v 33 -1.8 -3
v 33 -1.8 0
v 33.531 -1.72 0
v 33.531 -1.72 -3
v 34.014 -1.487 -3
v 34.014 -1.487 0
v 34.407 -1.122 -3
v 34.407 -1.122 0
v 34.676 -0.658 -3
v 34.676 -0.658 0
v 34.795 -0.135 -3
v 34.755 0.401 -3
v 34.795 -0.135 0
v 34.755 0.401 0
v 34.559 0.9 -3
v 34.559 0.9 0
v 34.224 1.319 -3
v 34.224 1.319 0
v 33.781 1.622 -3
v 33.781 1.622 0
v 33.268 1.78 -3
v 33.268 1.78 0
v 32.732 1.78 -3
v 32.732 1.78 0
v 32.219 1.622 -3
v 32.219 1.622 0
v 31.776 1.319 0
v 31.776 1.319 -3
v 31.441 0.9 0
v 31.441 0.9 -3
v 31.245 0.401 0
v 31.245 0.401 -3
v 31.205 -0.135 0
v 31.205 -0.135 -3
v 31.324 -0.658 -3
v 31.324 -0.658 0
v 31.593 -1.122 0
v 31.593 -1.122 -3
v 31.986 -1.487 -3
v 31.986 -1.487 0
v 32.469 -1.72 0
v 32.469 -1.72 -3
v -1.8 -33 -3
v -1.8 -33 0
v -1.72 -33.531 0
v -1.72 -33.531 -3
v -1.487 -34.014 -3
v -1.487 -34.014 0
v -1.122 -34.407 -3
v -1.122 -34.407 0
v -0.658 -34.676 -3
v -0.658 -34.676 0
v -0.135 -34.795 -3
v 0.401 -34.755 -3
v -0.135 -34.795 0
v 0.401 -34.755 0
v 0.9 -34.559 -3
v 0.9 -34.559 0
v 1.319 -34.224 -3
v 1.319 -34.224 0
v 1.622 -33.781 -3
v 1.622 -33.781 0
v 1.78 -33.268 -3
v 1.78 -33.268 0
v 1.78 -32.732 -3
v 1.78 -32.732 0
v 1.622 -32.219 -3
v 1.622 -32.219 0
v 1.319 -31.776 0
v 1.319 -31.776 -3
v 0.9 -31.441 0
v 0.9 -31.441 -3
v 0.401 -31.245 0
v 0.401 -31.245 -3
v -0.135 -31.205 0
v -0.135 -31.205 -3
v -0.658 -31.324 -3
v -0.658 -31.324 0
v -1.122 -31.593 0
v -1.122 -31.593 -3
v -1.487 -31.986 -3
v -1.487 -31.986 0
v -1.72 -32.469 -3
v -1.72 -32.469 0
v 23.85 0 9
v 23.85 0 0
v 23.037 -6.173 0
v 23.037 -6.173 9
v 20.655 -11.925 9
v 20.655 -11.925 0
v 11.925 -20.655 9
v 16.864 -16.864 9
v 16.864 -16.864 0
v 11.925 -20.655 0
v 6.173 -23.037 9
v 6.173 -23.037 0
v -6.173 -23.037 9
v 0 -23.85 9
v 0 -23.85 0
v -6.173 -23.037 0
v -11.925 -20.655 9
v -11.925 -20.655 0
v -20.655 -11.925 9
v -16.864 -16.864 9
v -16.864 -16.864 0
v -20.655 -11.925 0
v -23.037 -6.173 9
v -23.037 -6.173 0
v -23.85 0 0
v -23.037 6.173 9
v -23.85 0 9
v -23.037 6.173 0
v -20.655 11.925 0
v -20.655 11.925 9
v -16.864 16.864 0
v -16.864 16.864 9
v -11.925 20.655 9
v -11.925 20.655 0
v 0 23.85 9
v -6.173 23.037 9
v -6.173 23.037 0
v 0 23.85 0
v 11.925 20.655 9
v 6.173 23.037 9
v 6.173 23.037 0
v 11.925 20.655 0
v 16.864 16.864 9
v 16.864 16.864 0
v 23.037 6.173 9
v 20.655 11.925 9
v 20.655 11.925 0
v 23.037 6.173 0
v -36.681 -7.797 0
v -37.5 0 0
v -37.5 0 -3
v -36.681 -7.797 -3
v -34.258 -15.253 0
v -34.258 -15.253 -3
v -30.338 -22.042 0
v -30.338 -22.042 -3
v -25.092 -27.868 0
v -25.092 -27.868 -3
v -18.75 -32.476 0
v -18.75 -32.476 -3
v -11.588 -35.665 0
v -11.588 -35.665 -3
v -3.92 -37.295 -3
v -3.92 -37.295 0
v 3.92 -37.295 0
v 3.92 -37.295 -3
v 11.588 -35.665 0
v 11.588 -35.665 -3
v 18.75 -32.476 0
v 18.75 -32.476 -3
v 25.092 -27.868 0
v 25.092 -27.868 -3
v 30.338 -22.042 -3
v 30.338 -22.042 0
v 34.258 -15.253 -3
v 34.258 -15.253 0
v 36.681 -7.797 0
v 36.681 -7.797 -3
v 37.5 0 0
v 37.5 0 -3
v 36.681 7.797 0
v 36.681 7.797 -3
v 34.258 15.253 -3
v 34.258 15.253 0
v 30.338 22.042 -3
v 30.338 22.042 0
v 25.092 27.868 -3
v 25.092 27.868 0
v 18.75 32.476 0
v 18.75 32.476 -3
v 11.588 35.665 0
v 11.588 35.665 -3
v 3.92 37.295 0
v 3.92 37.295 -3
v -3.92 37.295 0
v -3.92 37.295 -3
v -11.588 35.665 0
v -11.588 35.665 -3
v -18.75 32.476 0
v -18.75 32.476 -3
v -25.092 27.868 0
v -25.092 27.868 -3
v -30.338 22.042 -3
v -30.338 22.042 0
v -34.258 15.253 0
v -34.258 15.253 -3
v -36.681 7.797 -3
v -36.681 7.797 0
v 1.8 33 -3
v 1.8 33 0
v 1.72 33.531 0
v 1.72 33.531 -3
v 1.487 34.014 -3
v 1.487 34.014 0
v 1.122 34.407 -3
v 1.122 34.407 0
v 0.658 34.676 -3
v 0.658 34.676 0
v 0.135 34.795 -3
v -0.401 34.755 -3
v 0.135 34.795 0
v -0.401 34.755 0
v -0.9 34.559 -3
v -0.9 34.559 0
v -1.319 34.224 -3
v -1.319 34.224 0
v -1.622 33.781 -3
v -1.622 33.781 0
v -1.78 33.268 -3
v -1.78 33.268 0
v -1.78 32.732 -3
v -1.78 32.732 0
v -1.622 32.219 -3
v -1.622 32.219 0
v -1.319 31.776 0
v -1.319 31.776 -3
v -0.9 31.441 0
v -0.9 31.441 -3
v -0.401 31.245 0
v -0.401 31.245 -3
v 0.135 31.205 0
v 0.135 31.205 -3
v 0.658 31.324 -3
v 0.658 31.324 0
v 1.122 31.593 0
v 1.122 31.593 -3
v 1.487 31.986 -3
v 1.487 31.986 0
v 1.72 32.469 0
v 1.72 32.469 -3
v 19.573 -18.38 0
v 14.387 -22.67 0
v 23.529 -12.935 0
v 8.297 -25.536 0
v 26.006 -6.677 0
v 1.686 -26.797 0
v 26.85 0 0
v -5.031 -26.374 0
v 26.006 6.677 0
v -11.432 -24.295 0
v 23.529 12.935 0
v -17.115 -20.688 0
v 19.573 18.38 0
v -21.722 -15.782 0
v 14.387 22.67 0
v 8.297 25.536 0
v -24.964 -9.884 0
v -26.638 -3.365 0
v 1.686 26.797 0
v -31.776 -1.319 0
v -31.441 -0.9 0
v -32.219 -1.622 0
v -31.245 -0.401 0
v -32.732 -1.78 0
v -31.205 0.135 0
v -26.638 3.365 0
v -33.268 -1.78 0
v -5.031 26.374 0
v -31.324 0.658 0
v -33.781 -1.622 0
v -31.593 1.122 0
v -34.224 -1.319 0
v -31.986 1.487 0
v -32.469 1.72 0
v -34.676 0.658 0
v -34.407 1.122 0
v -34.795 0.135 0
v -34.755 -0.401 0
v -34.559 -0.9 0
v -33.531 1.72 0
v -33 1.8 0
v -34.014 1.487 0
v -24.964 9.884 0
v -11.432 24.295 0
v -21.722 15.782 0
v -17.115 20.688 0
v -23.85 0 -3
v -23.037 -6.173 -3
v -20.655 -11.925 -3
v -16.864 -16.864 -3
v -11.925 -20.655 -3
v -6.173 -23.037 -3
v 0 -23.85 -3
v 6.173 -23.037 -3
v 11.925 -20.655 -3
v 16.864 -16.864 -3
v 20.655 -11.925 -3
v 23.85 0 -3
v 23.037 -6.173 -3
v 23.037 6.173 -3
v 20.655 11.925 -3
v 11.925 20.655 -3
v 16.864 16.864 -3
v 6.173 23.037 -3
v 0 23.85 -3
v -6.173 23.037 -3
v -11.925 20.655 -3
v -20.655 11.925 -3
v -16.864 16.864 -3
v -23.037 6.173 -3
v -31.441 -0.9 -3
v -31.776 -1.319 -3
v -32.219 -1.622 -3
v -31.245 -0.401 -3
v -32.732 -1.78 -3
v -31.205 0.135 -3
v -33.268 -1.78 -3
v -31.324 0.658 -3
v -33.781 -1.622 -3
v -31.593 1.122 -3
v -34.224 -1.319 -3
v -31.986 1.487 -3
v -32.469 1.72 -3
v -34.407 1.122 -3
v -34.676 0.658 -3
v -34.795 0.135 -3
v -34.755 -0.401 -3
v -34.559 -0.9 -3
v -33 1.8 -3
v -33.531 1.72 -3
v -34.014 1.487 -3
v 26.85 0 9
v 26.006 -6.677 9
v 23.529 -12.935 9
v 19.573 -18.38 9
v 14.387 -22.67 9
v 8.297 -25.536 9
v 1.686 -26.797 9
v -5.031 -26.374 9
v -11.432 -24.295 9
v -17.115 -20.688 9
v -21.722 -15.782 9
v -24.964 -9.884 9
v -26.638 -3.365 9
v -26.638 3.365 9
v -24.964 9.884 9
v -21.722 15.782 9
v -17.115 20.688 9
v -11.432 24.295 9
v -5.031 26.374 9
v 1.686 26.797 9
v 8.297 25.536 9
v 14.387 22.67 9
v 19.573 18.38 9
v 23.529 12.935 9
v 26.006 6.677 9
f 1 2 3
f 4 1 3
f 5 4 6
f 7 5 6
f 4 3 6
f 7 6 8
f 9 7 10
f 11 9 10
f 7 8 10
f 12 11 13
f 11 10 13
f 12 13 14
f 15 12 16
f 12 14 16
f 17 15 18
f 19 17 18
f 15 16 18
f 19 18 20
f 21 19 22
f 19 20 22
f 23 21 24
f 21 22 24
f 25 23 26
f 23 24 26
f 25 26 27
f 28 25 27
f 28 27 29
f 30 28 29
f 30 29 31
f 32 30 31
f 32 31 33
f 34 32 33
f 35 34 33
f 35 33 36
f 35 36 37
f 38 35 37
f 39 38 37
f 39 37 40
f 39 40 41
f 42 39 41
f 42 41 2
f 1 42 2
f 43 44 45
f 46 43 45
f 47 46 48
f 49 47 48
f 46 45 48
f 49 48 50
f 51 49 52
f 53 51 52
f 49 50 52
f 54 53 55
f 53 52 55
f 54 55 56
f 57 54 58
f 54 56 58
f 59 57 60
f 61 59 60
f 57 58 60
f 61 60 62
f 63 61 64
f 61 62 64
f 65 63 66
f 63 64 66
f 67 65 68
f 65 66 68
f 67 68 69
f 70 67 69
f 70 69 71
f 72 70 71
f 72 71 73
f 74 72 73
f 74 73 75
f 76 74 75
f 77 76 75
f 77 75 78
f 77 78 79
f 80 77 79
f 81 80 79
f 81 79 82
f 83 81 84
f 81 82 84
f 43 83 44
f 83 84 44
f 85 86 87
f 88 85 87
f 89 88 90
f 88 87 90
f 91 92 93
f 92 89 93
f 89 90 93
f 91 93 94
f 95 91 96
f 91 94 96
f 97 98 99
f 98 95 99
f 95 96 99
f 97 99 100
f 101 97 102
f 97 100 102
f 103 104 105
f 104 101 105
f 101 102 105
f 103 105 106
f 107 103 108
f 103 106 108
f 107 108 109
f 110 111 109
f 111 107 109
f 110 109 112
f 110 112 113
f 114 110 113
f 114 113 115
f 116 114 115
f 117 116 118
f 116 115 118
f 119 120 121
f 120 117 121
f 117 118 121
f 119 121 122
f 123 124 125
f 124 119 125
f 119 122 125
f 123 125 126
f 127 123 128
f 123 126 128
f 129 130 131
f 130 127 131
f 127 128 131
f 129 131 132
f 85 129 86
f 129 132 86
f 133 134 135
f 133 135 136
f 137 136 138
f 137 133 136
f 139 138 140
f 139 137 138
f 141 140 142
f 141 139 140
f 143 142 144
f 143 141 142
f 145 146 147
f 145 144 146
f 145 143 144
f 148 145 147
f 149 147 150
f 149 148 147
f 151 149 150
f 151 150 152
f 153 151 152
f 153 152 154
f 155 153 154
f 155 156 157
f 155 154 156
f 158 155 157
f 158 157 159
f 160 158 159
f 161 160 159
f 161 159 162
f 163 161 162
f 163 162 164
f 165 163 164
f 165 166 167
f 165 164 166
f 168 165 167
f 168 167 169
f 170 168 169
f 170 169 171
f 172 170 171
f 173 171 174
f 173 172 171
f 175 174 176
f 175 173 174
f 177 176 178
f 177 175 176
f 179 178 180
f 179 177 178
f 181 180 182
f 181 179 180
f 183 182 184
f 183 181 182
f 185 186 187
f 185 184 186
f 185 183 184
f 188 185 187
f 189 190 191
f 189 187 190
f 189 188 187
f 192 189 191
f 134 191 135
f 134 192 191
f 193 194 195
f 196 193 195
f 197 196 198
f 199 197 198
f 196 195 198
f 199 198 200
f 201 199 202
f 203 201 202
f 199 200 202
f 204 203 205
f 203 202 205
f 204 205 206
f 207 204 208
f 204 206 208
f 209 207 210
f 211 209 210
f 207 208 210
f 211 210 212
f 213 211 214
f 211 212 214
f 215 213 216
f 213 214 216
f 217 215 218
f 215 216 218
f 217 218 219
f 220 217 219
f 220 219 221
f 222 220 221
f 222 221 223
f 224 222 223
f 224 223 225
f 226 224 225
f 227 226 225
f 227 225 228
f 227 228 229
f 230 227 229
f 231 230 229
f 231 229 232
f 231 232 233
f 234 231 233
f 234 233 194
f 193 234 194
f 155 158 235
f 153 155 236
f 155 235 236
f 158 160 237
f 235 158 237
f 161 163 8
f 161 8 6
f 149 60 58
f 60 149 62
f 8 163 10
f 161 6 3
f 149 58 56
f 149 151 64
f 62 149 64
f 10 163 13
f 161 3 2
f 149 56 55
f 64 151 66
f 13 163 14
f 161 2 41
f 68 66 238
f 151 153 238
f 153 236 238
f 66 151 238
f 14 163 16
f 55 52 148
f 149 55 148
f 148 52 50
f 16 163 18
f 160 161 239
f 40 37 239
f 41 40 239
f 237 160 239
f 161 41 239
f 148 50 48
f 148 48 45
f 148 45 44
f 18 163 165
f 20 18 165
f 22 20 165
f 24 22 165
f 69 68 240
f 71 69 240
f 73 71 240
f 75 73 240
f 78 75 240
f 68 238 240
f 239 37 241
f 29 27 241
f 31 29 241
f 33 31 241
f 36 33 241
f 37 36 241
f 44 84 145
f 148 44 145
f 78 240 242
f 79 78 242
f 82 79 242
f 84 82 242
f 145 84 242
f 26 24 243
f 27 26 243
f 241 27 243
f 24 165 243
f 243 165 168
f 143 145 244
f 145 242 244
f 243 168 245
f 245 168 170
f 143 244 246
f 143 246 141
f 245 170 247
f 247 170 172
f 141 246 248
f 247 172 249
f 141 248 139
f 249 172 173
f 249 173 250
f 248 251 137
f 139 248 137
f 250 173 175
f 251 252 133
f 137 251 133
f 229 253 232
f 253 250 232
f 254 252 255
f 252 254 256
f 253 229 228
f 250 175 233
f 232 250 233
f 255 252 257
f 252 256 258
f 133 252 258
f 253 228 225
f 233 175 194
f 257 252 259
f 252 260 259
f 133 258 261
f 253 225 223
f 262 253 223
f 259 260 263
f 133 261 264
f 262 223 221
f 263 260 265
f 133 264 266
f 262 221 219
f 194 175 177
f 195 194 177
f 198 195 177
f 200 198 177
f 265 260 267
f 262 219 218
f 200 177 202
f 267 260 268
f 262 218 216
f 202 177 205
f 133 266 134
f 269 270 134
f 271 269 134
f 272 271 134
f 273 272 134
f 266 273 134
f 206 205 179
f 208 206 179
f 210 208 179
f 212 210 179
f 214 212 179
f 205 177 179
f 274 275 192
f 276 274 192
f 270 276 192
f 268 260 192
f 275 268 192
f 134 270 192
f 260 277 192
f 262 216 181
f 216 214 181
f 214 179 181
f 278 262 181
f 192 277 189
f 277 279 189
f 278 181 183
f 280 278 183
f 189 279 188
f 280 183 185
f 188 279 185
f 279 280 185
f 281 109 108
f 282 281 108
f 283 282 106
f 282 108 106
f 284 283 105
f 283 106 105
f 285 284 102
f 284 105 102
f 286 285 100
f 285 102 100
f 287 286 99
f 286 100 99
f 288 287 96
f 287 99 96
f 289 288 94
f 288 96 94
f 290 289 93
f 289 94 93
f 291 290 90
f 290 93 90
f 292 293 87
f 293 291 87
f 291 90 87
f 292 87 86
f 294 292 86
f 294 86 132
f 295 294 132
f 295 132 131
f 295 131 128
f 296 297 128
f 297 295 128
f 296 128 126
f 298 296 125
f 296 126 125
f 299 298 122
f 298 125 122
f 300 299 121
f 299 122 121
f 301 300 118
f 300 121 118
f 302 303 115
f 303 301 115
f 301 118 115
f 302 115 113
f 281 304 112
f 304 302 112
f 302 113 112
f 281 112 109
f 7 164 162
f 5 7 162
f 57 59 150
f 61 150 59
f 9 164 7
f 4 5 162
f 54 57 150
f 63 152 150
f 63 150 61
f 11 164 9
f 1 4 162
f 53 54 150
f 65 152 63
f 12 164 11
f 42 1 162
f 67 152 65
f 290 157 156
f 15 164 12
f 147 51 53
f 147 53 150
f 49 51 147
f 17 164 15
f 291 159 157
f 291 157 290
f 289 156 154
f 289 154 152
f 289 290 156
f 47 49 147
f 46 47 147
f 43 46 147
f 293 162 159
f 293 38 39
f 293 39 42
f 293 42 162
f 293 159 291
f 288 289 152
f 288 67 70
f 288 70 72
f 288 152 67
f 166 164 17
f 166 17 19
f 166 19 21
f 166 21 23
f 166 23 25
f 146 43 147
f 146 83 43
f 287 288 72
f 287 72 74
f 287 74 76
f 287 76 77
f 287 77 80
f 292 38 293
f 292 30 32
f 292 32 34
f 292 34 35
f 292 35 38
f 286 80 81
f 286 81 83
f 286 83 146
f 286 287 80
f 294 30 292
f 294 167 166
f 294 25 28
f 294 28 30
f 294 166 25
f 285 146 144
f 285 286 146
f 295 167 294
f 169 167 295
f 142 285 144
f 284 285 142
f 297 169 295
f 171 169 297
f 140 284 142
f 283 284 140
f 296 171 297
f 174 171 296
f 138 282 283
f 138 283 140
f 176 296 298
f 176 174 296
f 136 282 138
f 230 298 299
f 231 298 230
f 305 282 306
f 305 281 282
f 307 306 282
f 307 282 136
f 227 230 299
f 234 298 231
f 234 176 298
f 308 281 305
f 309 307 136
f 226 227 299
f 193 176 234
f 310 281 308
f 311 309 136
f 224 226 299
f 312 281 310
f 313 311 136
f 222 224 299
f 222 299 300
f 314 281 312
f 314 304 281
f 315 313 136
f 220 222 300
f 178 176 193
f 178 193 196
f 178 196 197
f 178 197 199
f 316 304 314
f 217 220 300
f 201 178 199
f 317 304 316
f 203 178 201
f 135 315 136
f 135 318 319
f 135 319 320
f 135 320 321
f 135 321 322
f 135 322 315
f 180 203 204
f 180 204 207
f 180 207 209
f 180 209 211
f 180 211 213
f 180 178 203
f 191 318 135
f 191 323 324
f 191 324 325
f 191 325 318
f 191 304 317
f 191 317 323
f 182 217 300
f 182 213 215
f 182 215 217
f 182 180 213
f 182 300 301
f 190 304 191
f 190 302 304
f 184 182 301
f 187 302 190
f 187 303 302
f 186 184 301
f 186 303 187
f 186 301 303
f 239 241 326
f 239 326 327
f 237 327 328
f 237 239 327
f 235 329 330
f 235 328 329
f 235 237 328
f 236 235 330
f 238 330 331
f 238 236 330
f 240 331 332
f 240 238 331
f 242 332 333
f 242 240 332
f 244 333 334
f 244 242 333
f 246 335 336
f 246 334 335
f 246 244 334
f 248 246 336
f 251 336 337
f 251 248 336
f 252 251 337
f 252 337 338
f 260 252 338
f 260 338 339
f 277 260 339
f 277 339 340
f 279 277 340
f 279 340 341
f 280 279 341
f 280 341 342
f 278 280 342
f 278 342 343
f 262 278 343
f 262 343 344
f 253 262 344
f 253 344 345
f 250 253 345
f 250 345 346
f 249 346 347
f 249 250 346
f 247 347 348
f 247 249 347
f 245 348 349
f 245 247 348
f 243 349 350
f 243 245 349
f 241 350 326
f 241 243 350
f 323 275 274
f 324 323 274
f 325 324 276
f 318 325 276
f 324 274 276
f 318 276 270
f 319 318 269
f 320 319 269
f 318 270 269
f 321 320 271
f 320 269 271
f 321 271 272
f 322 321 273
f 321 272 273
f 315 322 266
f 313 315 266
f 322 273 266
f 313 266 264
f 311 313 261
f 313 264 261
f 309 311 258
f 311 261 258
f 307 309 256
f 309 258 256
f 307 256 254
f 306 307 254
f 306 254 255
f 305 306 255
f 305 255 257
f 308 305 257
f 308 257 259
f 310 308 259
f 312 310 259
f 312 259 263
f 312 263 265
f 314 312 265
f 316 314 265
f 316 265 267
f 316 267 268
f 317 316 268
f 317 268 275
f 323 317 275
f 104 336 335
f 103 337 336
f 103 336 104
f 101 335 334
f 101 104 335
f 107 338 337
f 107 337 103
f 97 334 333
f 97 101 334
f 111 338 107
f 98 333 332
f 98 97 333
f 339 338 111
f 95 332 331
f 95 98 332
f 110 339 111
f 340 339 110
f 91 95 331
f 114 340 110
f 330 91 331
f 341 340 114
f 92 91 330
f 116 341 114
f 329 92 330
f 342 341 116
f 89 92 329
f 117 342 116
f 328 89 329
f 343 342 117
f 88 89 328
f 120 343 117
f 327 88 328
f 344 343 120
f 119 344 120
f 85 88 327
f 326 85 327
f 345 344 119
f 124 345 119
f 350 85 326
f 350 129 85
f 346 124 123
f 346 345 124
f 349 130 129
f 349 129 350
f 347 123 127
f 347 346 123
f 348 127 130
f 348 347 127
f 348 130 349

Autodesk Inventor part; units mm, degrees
ref_plane "YZ Plane" through (0, 0, 0) normal (1, 0, 0) x (0, 1, 0)
ref_plane "XZ Plane" through (0, 0, 0) normal (0, 1, 0) x (-1, 0, 0)
ref_plane "XY Plane" through (0, 0, 0) normal (0, 0, 1) x (1, 0, 0)
sketch "Boceto1" plane through (0, 0, 0) normal (0, 0, 1) x (1, 0, 0)
  circle A0 centre (0, 0) radius 23.85
  circle A1 centre (0, 0) radius 26.85
  dimension "d0" = 47.7
  dimension "d1" = 3
extrude "Extrusión1" add sketch "Boceto1" along normal blind 9
sketch "Boceto2" plane through (0, 0, 0) normal (0, 0, -1) x (-1, 0, 0)
  circle A0 centre (0, 0) radius 37.5
  circle A1 centre (0, 0) radius 23.85 projected
  dimension "d4" = 75
extrude "Extrusión2" add sketch "Boceto2" along normal blind 3
sketch "Boceto6" plane through (0, 0, 0) normal (0, 0, 1) x (1, 0, 0)
  circle A0 centre (0, 33) radius 1.8
  point P0 (0, 0)
  dimension "d19" = 3.6
  dimension "d20" = 33
extrude "Extrusión5" cut sketch "Boceto6" against normal blind 10
pattern_circular "Patrón circular1" count 4 over 360 about axis through (0, 0, -10) along (0, 0, 1) of "Extrusión5"
properties part number "AcoplecN°2"
